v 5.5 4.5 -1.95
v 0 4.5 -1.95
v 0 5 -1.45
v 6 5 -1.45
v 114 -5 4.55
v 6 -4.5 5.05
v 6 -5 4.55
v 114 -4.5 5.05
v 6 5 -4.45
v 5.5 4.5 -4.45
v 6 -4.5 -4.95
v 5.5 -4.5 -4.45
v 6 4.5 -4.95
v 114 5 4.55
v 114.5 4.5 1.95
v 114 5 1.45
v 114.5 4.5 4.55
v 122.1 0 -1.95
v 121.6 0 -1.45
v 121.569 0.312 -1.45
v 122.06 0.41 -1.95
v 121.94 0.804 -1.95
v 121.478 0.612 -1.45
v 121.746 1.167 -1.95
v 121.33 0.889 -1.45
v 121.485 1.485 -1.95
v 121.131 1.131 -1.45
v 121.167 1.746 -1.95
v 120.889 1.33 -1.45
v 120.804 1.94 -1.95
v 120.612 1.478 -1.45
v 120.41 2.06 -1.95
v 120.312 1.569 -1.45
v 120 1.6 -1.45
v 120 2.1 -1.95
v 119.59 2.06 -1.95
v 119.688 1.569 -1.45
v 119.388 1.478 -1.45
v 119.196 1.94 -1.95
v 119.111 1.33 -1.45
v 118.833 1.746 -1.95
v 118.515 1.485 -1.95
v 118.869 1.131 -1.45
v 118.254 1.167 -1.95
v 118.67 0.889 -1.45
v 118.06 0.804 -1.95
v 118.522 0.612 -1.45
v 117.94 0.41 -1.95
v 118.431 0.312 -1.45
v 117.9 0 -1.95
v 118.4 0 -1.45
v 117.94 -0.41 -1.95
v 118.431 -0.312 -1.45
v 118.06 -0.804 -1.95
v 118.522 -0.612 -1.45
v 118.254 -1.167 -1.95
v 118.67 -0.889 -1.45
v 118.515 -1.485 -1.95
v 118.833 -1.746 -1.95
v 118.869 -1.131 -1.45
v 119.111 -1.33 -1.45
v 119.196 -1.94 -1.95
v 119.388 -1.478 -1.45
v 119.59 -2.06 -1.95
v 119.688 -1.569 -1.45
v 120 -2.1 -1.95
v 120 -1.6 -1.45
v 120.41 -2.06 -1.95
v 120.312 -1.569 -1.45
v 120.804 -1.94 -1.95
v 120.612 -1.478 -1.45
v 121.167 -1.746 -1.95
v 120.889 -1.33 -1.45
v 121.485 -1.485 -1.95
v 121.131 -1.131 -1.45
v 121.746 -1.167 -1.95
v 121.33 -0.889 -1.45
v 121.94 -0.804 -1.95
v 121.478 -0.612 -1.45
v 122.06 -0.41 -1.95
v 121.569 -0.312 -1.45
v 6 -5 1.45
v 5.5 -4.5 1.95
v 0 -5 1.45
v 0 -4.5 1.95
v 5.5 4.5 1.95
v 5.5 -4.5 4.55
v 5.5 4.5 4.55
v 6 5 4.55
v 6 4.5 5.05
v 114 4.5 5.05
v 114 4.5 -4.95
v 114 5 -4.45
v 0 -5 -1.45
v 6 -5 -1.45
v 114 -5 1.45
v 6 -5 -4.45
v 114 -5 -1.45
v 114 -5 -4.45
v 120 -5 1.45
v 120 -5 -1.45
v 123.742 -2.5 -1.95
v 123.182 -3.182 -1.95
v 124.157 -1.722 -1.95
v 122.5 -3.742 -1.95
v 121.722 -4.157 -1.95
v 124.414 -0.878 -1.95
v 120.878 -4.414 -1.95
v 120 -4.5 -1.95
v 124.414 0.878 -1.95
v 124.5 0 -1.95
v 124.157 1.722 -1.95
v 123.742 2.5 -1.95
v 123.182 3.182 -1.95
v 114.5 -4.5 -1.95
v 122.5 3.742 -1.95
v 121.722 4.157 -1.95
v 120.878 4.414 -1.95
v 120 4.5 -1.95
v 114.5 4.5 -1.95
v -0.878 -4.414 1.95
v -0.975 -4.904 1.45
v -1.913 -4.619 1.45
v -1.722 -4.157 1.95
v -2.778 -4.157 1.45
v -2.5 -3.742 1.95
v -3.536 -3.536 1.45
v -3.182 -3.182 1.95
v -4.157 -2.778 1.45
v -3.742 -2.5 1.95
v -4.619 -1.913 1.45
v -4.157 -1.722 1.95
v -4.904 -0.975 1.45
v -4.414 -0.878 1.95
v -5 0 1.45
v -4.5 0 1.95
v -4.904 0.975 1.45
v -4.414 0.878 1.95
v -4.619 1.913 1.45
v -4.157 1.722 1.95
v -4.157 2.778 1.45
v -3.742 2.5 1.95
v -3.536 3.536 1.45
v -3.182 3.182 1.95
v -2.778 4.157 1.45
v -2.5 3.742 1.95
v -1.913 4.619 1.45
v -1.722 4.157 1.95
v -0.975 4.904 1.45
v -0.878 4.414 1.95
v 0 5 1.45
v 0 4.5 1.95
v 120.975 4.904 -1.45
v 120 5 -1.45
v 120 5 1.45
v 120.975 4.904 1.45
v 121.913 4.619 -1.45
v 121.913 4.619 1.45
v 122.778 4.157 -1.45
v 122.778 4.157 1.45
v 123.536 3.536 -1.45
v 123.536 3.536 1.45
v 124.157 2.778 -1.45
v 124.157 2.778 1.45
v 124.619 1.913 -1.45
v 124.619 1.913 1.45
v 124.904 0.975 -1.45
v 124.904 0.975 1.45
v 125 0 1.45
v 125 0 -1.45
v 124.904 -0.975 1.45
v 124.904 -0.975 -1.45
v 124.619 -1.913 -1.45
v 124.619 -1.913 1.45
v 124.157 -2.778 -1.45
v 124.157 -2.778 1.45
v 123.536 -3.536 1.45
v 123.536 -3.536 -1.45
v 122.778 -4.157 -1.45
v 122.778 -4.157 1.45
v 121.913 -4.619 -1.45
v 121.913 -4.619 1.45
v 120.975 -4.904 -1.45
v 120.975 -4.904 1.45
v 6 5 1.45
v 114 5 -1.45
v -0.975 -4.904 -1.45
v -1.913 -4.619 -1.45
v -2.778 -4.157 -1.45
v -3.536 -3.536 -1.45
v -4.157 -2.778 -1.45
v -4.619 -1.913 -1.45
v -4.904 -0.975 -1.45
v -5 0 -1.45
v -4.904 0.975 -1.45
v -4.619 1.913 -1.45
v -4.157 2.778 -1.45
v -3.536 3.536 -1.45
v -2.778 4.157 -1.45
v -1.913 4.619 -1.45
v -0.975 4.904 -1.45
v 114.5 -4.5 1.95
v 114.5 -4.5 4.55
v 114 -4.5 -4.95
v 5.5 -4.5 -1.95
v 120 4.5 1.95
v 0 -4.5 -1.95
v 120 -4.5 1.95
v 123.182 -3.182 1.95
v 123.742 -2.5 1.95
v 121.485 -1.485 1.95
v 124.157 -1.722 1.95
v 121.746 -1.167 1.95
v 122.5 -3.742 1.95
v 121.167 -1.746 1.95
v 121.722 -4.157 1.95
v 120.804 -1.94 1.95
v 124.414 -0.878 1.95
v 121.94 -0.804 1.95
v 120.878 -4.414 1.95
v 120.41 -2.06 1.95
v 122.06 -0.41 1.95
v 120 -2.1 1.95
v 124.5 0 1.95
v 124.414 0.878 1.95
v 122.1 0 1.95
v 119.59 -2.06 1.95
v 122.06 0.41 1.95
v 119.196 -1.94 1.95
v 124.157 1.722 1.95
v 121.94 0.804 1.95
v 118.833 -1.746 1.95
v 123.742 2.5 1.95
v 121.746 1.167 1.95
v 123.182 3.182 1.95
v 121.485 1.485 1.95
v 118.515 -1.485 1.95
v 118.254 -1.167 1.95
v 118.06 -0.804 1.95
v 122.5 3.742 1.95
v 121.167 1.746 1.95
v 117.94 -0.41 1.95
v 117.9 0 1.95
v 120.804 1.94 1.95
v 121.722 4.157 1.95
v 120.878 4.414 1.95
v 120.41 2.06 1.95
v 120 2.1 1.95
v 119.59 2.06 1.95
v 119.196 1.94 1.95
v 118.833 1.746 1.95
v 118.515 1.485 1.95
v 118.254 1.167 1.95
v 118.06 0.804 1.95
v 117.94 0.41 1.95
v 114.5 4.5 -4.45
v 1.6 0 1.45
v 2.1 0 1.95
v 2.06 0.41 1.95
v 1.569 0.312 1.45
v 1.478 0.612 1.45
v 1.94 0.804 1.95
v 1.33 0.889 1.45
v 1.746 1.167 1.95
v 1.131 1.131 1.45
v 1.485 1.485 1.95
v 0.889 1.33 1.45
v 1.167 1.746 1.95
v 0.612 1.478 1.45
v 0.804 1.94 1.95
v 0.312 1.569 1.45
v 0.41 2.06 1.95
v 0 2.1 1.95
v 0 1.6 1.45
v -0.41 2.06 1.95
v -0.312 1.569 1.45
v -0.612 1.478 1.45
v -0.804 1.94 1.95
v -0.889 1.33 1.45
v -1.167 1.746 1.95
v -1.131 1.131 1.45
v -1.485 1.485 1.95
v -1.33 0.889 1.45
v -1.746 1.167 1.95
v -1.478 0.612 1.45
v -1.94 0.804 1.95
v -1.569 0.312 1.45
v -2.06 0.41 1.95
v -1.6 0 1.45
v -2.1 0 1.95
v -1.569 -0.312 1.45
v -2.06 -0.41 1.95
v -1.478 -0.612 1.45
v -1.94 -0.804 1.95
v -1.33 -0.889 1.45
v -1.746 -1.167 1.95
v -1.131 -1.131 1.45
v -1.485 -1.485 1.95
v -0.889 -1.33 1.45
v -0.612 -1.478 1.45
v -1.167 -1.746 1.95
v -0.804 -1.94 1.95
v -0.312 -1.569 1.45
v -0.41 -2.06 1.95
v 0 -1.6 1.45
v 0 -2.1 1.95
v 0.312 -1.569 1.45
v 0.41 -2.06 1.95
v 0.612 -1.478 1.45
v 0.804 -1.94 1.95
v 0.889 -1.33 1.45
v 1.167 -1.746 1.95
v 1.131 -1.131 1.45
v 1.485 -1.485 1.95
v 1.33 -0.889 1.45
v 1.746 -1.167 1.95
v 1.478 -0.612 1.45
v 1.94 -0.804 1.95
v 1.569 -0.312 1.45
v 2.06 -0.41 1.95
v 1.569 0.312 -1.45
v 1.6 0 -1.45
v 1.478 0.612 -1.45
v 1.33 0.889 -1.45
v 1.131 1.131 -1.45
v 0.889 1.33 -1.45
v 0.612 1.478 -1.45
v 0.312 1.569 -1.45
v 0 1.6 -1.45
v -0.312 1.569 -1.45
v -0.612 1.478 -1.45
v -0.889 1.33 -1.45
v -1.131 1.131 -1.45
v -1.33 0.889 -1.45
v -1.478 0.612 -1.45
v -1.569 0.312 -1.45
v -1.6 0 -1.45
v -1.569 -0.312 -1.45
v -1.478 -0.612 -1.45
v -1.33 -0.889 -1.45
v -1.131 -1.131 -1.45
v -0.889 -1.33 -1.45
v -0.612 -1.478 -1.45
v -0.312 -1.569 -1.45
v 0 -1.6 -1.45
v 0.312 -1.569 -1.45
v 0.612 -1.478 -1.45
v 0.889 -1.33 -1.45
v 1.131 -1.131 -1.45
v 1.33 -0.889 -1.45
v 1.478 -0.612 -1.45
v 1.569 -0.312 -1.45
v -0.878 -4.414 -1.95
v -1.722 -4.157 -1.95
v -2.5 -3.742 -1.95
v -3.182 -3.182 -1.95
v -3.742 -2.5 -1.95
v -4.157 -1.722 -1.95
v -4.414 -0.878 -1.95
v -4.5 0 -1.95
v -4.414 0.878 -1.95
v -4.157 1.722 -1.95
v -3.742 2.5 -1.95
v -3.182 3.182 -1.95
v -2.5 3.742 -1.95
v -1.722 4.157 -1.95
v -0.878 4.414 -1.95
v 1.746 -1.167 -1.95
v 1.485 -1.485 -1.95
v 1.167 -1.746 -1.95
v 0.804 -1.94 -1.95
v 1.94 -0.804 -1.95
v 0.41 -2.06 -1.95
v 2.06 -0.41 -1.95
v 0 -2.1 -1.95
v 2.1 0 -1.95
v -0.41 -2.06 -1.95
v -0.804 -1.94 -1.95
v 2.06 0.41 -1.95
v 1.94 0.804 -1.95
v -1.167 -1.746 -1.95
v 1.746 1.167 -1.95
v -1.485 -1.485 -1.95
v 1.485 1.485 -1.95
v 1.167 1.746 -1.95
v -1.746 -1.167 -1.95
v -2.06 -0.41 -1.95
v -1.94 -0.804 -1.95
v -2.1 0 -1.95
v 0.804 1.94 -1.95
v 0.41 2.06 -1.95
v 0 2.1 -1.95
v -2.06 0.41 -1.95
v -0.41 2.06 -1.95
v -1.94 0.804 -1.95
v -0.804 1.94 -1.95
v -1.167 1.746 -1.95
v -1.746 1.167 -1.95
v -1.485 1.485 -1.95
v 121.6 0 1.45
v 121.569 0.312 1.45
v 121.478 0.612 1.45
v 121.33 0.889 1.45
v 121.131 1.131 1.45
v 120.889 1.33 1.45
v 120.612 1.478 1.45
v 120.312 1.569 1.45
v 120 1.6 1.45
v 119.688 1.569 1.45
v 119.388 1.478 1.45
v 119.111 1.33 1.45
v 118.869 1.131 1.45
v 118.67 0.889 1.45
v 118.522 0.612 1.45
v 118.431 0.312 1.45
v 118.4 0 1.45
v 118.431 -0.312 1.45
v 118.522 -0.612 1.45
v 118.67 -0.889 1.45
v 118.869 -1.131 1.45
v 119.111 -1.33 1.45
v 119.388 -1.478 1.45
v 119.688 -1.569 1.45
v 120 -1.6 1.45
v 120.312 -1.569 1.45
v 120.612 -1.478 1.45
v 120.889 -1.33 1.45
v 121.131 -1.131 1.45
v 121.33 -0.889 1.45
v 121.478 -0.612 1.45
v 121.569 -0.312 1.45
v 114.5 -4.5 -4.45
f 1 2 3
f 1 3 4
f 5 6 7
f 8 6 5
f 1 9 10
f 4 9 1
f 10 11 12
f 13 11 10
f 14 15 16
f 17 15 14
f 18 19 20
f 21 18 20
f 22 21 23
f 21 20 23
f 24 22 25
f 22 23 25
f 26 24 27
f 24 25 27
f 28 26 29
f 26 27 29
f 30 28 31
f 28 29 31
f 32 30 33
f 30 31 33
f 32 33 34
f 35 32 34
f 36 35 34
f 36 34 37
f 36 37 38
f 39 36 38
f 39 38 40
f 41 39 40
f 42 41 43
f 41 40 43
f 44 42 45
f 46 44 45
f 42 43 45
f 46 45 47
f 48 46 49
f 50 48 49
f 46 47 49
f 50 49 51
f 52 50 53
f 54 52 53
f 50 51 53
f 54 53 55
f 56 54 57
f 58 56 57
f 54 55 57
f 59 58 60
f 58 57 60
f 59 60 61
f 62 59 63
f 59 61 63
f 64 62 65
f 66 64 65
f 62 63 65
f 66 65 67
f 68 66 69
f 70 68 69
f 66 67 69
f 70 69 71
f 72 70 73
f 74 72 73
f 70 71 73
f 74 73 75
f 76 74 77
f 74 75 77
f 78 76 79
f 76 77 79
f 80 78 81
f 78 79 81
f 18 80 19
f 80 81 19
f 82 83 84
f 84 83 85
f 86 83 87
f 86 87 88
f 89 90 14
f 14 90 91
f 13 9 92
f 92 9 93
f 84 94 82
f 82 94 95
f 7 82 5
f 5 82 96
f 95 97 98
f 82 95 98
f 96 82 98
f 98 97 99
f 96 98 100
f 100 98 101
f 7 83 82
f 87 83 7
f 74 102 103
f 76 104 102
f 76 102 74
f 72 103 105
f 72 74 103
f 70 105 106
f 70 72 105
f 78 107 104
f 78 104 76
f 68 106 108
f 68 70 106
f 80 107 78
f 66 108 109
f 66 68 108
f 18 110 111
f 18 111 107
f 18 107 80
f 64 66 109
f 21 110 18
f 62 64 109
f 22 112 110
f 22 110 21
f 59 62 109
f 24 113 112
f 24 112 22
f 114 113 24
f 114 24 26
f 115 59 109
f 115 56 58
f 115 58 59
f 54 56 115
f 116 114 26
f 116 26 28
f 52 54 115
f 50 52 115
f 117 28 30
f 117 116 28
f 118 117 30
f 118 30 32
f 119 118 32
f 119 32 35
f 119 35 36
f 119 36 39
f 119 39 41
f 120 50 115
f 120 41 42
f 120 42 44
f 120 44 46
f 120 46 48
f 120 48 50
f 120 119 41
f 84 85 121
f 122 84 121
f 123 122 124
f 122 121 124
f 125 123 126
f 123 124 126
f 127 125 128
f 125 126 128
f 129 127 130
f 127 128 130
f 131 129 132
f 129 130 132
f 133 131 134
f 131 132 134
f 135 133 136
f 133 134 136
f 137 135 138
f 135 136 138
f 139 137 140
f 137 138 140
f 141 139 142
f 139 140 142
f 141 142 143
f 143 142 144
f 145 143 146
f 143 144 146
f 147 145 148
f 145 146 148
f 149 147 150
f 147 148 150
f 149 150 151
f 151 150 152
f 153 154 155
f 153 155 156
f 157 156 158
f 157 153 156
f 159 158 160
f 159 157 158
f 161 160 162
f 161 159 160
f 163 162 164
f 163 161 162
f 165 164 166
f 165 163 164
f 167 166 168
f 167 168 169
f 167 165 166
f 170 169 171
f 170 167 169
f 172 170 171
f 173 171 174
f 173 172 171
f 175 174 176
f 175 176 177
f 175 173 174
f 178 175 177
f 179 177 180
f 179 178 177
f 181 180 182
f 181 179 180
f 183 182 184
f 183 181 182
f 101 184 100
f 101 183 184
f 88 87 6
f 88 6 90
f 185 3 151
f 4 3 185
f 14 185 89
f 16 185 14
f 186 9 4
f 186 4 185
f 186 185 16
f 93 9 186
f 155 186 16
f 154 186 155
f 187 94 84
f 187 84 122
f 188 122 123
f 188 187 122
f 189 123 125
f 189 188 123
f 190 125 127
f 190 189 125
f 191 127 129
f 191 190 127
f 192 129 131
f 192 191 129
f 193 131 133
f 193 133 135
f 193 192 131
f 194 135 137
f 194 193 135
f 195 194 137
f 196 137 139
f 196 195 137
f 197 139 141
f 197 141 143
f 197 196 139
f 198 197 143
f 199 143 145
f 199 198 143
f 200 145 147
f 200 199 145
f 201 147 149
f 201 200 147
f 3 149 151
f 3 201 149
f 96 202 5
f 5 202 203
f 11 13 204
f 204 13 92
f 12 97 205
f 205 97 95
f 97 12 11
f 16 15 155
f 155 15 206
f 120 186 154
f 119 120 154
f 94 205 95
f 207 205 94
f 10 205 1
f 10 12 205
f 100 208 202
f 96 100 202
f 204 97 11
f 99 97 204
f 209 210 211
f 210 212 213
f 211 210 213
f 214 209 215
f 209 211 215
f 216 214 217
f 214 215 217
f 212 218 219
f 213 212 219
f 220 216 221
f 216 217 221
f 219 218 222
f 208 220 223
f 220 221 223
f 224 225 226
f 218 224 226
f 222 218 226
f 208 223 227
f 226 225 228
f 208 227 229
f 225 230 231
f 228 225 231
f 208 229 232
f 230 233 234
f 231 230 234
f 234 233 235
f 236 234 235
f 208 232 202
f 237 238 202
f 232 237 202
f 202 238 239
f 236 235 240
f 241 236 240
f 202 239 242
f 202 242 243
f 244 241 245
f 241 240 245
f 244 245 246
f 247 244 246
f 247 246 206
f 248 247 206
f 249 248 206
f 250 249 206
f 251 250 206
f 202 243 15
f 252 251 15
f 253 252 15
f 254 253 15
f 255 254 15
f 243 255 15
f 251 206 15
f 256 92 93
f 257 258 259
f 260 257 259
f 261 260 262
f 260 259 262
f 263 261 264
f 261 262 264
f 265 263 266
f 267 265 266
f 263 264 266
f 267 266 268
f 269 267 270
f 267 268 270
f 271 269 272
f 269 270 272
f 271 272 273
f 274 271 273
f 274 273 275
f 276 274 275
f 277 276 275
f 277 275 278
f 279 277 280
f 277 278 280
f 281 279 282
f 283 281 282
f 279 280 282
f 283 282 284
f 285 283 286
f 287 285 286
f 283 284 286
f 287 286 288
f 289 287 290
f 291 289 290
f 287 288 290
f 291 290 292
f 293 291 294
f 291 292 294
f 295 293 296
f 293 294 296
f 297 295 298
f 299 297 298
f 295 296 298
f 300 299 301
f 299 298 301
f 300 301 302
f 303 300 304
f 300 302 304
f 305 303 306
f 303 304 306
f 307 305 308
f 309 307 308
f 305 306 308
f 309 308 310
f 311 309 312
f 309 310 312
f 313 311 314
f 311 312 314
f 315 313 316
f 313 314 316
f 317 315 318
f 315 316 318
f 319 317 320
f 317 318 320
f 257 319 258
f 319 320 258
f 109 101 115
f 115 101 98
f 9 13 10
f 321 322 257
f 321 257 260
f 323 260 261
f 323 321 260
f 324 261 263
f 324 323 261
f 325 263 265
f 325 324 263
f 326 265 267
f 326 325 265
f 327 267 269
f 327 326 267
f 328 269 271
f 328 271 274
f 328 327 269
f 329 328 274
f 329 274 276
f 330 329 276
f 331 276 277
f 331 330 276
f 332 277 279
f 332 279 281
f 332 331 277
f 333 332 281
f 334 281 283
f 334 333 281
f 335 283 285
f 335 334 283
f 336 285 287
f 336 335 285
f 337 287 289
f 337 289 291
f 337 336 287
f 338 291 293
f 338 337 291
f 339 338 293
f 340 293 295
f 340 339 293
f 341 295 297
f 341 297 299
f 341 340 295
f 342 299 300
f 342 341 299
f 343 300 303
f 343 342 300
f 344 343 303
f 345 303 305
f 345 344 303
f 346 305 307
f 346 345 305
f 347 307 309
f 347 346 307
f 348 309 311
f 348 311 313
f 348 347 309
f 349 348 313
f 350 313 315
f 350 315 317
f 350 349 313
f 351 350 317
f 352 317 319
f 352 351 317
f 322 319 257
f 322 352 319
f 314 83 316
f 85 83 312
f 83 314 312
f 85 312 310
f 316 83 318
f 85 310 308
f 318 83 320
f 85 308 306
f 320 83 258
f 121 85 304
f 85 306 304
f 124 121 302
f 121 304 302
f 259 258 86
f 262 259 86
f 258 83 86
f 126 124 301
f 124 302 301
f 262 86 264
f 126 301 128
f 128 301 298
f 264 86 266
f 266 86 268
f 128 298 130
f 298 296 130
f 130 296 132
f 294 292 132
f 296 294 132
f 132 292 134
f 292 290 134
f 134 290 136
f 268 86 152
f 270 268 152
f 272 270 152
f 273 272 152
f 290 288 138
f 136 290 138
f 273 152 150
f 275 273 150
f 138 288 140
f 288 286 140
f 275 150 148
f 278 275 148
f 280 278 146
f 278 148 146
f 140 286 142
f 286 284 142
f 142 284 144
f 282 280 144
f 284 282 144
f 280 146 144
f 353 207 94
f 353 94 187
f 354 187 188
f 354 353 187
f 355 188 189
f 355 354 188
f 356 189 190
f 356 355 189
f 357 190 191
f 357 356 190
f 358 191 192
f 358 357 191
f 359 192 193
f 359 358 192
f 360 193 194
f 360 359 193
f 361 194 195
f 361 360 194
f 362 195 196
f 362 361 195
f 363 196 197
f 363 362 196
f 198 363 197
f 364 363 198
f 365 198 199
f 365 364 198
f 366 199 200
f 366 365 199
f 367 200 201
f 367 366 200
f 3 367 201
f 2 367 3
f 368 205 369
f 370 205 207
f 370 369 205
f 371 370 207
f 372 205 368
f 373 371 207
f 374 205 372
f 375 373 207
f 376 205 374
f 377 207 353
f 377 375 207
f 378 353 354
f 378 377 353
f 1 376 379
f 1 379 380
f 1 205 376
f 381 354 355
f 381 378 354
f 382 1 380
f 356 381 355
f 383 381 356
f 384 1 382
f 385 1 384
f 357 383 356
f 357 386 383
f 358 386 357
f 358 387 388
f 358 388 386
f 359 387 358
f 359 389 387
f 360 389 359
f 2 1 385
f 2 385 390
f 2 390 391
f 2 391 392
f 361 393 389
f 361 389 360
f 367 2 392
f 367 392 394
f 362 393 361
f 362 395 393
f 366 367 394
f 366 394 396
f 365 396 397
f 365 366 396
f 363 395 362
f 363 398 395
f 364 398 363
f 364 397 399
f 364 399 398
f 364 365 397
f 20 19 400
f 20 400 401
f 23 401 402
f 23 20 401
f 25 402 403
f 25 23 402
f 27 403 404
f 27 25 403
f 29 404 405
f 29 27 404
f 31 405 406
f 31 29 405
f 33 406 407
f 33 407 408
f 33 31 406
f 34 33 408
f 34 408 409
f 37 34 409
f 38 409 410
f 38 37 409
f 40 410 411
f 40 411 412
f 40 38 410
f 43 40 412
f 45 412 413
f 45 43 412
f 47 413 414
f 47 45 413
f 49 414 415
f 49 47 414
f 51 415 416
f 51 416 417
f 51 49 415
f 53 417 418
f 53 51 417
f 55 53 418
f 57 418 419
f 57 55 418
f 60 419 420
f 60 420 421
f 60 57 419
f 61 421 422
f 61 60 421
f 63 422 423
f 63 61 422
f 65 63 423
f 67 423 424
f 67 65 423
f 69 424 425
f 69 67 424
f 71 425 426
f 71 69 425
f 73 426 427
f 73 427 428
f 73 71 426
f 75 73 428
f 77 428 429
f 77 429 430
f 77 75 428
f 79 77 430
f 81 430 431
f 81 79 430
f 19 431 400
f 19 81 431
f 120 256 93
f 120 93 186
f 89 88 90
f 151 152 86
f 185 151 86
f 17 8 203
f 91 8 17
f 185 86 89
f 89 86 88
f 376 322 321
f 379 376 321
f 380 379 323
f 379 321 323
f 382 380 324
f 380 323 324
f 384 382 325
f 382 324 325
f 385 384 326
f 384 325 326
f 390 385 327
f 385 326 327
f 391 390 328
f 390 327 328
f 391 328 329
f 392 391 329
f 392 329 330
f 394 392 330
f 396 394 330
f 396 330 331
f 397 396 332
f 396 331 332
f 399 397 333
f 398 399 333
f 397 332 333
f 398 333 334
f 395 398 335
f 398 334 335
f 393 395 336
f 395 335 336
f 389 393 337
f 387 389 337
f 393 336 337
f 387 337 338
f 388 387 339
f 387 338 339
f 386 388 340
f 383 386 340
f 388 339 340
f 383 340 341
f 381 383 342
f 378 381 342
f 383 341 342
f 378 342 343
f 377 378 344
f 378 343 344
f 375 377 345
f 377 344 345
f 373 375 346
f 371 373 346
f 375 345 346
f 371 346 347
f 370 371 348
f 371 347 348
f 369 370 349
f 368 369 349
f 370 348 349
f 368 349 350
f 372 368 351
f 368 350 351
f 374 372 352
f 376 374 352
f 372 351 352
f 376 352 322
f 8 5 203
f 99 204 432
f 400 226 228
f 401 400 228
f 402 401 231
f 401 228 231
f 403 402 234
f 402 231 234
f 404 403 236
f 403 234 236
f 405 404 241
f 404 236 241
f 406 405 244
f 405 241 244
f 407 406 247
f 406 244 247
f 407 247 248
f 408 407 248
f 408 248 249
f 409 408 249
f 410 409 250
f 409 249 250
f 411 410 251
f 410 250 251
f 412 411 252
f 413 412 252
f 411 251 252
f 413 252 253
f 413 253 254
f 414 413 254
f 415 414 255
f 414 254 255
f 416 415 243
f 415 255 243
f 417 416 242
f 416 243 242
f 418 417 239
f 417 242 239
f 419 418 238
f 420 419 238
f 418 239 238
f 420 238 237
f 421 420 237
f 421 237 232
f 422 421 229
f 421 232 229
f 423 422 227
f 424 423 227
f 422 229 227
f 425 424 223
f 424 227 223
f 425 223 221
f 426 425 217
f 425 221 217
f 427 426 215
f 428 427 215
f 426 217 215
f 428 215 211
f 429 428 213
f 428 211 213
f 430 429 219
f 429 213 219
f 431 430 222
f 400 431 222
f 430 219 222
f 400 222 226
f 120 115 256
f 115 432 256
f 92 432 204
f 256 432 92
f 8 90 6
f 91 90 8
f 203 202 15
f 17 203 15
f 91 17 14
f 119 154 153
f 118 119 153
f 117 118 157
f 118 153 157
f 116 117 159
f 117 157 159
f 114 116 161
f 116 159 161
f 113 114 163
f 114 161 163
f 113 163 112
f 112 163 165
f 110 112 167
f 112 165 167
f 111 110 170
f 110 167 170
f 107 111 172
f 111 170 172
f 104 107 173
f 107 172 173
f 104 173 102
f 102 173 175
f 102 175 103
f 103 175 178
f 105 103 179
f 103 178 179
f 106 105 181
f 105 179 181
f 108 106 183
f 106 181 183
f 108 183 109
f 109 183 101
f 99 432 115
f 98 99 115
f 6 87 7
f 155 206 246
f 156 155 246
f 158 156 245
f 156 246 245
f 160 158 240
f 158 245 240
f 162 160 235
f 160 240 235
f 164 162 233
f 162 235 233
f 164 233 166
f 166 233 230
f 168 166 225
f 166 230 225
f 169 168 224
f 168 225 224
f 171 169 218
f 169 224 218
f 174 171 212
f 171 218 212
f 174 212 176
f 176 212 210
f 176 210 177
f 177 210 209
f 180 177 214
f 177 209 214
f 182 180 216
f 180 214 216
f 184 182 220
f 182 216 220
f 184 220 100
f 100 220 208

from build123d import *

# Parameters (mm, degrees)
BOSS_EXTRUDE1_DEPTH      = 1.95
BOSS_EXTRUDE1_DEPTH_BACK = 1.95
SKETCH1_R                = 1.6
BOSS_EXTRUDE2_DEPTH      = 3.1
BOSS_EXTRUDE2_DEPTH_BACK = 6.9
SKETCH2_W                = 109
SKETCH2_H                = 10
CHAMFER1_SIZE            = 0.5


with BuildPart() as part:
    # Sketch1 → Boss-Extrude1 (new, two sides: drawn at the far end of the back side and taken through both)
    with BuildSketch(Plane.XY.offset(-BOSS_EXTRUDE1_DEPTH_BACK)):
        with BuildLine():
            Line((0, 5), (120, 5))
            ThreePointArc((120, 5), (125, 0), (120, -5))
            Line((120, -5), (0, -5))
            ThreePointArc((0, -5), (-5, 0), (0, 5))
        make_face()
        Circle(SKETCH1_R, mode=Mode.SUBTRACT)
        with Locations((120, 0)):
            Circle(SKETCH1_R, mode=Mode.SUBTRACT)
    extrude(amount=BOSS_EXTRUDE1_DEPTH + BOSS_EXTRUDE1_DEPTH_BACK)

    # Sketch2 → Boss-Extrude2 (add, two sides: drawn at the far end of the back side and taken through both)
    with BuildSketch(Plane.XY.offset(1.95).offset(-BOSS_EXTRUDE2_DEPTH_BACK)):
        with Locations((60, 0)):
            Rectangle(SKETCH2_W, SKETCH2_H)
    extrude(amount=BOSS_EXTRUDE2_DEPTH + BOSS_EXTRUDE2_DEPTH_BACK)

    # Chamfer1
    chamfer1_edges = [part.edges().sort_by_distance(p)[0] for p in [
        (125, 0, -1.95),
        (-1.6, 0, -1.95),
        (117.25, 5, -1.95),
        (118.4, 0, -1.95),
        (-5, 0, 1.95),
        (2.75, -5, 1.95),
        (125, 0, 1.95),
        (117.25, 5, 1.95),
        (-1.6, 0, 1.95),
        (118.4, 0, 1.95),
        (117.25, -5, 1.95),
        (2.75, 5, 1.95),
        (2.75, 5, -1.95),
        (117.25, -5, -1.95),
        (-5, 0, -1.95),
        (5.5, 0, -4.95),
        (5.5, -5, -3.45),
        (60, 5, -4.95),
        (5.5, 5, -3.45),
        (114.5, 0, -4.95),
        (114.5, 5, -3.45),
        (60, -5, -4.95),
        (114.5, -5, -3.45),
        (5.5, -5, 3.5),
        (5.5, 5, 3.5),
        (114.5, 5, 3.5),
        (114.5, -5, 3.5),
        (5.5, 0, 5.05),
        (60, -5, 5.05),
        (114.5, 0, 5.05),
        (60, 5, 5.05),
        (2.75, -5, -1.95),
    ]]
    chamfer(chamfer1_edges, length=CHAMFER1_SIZE)


solid = part.part
